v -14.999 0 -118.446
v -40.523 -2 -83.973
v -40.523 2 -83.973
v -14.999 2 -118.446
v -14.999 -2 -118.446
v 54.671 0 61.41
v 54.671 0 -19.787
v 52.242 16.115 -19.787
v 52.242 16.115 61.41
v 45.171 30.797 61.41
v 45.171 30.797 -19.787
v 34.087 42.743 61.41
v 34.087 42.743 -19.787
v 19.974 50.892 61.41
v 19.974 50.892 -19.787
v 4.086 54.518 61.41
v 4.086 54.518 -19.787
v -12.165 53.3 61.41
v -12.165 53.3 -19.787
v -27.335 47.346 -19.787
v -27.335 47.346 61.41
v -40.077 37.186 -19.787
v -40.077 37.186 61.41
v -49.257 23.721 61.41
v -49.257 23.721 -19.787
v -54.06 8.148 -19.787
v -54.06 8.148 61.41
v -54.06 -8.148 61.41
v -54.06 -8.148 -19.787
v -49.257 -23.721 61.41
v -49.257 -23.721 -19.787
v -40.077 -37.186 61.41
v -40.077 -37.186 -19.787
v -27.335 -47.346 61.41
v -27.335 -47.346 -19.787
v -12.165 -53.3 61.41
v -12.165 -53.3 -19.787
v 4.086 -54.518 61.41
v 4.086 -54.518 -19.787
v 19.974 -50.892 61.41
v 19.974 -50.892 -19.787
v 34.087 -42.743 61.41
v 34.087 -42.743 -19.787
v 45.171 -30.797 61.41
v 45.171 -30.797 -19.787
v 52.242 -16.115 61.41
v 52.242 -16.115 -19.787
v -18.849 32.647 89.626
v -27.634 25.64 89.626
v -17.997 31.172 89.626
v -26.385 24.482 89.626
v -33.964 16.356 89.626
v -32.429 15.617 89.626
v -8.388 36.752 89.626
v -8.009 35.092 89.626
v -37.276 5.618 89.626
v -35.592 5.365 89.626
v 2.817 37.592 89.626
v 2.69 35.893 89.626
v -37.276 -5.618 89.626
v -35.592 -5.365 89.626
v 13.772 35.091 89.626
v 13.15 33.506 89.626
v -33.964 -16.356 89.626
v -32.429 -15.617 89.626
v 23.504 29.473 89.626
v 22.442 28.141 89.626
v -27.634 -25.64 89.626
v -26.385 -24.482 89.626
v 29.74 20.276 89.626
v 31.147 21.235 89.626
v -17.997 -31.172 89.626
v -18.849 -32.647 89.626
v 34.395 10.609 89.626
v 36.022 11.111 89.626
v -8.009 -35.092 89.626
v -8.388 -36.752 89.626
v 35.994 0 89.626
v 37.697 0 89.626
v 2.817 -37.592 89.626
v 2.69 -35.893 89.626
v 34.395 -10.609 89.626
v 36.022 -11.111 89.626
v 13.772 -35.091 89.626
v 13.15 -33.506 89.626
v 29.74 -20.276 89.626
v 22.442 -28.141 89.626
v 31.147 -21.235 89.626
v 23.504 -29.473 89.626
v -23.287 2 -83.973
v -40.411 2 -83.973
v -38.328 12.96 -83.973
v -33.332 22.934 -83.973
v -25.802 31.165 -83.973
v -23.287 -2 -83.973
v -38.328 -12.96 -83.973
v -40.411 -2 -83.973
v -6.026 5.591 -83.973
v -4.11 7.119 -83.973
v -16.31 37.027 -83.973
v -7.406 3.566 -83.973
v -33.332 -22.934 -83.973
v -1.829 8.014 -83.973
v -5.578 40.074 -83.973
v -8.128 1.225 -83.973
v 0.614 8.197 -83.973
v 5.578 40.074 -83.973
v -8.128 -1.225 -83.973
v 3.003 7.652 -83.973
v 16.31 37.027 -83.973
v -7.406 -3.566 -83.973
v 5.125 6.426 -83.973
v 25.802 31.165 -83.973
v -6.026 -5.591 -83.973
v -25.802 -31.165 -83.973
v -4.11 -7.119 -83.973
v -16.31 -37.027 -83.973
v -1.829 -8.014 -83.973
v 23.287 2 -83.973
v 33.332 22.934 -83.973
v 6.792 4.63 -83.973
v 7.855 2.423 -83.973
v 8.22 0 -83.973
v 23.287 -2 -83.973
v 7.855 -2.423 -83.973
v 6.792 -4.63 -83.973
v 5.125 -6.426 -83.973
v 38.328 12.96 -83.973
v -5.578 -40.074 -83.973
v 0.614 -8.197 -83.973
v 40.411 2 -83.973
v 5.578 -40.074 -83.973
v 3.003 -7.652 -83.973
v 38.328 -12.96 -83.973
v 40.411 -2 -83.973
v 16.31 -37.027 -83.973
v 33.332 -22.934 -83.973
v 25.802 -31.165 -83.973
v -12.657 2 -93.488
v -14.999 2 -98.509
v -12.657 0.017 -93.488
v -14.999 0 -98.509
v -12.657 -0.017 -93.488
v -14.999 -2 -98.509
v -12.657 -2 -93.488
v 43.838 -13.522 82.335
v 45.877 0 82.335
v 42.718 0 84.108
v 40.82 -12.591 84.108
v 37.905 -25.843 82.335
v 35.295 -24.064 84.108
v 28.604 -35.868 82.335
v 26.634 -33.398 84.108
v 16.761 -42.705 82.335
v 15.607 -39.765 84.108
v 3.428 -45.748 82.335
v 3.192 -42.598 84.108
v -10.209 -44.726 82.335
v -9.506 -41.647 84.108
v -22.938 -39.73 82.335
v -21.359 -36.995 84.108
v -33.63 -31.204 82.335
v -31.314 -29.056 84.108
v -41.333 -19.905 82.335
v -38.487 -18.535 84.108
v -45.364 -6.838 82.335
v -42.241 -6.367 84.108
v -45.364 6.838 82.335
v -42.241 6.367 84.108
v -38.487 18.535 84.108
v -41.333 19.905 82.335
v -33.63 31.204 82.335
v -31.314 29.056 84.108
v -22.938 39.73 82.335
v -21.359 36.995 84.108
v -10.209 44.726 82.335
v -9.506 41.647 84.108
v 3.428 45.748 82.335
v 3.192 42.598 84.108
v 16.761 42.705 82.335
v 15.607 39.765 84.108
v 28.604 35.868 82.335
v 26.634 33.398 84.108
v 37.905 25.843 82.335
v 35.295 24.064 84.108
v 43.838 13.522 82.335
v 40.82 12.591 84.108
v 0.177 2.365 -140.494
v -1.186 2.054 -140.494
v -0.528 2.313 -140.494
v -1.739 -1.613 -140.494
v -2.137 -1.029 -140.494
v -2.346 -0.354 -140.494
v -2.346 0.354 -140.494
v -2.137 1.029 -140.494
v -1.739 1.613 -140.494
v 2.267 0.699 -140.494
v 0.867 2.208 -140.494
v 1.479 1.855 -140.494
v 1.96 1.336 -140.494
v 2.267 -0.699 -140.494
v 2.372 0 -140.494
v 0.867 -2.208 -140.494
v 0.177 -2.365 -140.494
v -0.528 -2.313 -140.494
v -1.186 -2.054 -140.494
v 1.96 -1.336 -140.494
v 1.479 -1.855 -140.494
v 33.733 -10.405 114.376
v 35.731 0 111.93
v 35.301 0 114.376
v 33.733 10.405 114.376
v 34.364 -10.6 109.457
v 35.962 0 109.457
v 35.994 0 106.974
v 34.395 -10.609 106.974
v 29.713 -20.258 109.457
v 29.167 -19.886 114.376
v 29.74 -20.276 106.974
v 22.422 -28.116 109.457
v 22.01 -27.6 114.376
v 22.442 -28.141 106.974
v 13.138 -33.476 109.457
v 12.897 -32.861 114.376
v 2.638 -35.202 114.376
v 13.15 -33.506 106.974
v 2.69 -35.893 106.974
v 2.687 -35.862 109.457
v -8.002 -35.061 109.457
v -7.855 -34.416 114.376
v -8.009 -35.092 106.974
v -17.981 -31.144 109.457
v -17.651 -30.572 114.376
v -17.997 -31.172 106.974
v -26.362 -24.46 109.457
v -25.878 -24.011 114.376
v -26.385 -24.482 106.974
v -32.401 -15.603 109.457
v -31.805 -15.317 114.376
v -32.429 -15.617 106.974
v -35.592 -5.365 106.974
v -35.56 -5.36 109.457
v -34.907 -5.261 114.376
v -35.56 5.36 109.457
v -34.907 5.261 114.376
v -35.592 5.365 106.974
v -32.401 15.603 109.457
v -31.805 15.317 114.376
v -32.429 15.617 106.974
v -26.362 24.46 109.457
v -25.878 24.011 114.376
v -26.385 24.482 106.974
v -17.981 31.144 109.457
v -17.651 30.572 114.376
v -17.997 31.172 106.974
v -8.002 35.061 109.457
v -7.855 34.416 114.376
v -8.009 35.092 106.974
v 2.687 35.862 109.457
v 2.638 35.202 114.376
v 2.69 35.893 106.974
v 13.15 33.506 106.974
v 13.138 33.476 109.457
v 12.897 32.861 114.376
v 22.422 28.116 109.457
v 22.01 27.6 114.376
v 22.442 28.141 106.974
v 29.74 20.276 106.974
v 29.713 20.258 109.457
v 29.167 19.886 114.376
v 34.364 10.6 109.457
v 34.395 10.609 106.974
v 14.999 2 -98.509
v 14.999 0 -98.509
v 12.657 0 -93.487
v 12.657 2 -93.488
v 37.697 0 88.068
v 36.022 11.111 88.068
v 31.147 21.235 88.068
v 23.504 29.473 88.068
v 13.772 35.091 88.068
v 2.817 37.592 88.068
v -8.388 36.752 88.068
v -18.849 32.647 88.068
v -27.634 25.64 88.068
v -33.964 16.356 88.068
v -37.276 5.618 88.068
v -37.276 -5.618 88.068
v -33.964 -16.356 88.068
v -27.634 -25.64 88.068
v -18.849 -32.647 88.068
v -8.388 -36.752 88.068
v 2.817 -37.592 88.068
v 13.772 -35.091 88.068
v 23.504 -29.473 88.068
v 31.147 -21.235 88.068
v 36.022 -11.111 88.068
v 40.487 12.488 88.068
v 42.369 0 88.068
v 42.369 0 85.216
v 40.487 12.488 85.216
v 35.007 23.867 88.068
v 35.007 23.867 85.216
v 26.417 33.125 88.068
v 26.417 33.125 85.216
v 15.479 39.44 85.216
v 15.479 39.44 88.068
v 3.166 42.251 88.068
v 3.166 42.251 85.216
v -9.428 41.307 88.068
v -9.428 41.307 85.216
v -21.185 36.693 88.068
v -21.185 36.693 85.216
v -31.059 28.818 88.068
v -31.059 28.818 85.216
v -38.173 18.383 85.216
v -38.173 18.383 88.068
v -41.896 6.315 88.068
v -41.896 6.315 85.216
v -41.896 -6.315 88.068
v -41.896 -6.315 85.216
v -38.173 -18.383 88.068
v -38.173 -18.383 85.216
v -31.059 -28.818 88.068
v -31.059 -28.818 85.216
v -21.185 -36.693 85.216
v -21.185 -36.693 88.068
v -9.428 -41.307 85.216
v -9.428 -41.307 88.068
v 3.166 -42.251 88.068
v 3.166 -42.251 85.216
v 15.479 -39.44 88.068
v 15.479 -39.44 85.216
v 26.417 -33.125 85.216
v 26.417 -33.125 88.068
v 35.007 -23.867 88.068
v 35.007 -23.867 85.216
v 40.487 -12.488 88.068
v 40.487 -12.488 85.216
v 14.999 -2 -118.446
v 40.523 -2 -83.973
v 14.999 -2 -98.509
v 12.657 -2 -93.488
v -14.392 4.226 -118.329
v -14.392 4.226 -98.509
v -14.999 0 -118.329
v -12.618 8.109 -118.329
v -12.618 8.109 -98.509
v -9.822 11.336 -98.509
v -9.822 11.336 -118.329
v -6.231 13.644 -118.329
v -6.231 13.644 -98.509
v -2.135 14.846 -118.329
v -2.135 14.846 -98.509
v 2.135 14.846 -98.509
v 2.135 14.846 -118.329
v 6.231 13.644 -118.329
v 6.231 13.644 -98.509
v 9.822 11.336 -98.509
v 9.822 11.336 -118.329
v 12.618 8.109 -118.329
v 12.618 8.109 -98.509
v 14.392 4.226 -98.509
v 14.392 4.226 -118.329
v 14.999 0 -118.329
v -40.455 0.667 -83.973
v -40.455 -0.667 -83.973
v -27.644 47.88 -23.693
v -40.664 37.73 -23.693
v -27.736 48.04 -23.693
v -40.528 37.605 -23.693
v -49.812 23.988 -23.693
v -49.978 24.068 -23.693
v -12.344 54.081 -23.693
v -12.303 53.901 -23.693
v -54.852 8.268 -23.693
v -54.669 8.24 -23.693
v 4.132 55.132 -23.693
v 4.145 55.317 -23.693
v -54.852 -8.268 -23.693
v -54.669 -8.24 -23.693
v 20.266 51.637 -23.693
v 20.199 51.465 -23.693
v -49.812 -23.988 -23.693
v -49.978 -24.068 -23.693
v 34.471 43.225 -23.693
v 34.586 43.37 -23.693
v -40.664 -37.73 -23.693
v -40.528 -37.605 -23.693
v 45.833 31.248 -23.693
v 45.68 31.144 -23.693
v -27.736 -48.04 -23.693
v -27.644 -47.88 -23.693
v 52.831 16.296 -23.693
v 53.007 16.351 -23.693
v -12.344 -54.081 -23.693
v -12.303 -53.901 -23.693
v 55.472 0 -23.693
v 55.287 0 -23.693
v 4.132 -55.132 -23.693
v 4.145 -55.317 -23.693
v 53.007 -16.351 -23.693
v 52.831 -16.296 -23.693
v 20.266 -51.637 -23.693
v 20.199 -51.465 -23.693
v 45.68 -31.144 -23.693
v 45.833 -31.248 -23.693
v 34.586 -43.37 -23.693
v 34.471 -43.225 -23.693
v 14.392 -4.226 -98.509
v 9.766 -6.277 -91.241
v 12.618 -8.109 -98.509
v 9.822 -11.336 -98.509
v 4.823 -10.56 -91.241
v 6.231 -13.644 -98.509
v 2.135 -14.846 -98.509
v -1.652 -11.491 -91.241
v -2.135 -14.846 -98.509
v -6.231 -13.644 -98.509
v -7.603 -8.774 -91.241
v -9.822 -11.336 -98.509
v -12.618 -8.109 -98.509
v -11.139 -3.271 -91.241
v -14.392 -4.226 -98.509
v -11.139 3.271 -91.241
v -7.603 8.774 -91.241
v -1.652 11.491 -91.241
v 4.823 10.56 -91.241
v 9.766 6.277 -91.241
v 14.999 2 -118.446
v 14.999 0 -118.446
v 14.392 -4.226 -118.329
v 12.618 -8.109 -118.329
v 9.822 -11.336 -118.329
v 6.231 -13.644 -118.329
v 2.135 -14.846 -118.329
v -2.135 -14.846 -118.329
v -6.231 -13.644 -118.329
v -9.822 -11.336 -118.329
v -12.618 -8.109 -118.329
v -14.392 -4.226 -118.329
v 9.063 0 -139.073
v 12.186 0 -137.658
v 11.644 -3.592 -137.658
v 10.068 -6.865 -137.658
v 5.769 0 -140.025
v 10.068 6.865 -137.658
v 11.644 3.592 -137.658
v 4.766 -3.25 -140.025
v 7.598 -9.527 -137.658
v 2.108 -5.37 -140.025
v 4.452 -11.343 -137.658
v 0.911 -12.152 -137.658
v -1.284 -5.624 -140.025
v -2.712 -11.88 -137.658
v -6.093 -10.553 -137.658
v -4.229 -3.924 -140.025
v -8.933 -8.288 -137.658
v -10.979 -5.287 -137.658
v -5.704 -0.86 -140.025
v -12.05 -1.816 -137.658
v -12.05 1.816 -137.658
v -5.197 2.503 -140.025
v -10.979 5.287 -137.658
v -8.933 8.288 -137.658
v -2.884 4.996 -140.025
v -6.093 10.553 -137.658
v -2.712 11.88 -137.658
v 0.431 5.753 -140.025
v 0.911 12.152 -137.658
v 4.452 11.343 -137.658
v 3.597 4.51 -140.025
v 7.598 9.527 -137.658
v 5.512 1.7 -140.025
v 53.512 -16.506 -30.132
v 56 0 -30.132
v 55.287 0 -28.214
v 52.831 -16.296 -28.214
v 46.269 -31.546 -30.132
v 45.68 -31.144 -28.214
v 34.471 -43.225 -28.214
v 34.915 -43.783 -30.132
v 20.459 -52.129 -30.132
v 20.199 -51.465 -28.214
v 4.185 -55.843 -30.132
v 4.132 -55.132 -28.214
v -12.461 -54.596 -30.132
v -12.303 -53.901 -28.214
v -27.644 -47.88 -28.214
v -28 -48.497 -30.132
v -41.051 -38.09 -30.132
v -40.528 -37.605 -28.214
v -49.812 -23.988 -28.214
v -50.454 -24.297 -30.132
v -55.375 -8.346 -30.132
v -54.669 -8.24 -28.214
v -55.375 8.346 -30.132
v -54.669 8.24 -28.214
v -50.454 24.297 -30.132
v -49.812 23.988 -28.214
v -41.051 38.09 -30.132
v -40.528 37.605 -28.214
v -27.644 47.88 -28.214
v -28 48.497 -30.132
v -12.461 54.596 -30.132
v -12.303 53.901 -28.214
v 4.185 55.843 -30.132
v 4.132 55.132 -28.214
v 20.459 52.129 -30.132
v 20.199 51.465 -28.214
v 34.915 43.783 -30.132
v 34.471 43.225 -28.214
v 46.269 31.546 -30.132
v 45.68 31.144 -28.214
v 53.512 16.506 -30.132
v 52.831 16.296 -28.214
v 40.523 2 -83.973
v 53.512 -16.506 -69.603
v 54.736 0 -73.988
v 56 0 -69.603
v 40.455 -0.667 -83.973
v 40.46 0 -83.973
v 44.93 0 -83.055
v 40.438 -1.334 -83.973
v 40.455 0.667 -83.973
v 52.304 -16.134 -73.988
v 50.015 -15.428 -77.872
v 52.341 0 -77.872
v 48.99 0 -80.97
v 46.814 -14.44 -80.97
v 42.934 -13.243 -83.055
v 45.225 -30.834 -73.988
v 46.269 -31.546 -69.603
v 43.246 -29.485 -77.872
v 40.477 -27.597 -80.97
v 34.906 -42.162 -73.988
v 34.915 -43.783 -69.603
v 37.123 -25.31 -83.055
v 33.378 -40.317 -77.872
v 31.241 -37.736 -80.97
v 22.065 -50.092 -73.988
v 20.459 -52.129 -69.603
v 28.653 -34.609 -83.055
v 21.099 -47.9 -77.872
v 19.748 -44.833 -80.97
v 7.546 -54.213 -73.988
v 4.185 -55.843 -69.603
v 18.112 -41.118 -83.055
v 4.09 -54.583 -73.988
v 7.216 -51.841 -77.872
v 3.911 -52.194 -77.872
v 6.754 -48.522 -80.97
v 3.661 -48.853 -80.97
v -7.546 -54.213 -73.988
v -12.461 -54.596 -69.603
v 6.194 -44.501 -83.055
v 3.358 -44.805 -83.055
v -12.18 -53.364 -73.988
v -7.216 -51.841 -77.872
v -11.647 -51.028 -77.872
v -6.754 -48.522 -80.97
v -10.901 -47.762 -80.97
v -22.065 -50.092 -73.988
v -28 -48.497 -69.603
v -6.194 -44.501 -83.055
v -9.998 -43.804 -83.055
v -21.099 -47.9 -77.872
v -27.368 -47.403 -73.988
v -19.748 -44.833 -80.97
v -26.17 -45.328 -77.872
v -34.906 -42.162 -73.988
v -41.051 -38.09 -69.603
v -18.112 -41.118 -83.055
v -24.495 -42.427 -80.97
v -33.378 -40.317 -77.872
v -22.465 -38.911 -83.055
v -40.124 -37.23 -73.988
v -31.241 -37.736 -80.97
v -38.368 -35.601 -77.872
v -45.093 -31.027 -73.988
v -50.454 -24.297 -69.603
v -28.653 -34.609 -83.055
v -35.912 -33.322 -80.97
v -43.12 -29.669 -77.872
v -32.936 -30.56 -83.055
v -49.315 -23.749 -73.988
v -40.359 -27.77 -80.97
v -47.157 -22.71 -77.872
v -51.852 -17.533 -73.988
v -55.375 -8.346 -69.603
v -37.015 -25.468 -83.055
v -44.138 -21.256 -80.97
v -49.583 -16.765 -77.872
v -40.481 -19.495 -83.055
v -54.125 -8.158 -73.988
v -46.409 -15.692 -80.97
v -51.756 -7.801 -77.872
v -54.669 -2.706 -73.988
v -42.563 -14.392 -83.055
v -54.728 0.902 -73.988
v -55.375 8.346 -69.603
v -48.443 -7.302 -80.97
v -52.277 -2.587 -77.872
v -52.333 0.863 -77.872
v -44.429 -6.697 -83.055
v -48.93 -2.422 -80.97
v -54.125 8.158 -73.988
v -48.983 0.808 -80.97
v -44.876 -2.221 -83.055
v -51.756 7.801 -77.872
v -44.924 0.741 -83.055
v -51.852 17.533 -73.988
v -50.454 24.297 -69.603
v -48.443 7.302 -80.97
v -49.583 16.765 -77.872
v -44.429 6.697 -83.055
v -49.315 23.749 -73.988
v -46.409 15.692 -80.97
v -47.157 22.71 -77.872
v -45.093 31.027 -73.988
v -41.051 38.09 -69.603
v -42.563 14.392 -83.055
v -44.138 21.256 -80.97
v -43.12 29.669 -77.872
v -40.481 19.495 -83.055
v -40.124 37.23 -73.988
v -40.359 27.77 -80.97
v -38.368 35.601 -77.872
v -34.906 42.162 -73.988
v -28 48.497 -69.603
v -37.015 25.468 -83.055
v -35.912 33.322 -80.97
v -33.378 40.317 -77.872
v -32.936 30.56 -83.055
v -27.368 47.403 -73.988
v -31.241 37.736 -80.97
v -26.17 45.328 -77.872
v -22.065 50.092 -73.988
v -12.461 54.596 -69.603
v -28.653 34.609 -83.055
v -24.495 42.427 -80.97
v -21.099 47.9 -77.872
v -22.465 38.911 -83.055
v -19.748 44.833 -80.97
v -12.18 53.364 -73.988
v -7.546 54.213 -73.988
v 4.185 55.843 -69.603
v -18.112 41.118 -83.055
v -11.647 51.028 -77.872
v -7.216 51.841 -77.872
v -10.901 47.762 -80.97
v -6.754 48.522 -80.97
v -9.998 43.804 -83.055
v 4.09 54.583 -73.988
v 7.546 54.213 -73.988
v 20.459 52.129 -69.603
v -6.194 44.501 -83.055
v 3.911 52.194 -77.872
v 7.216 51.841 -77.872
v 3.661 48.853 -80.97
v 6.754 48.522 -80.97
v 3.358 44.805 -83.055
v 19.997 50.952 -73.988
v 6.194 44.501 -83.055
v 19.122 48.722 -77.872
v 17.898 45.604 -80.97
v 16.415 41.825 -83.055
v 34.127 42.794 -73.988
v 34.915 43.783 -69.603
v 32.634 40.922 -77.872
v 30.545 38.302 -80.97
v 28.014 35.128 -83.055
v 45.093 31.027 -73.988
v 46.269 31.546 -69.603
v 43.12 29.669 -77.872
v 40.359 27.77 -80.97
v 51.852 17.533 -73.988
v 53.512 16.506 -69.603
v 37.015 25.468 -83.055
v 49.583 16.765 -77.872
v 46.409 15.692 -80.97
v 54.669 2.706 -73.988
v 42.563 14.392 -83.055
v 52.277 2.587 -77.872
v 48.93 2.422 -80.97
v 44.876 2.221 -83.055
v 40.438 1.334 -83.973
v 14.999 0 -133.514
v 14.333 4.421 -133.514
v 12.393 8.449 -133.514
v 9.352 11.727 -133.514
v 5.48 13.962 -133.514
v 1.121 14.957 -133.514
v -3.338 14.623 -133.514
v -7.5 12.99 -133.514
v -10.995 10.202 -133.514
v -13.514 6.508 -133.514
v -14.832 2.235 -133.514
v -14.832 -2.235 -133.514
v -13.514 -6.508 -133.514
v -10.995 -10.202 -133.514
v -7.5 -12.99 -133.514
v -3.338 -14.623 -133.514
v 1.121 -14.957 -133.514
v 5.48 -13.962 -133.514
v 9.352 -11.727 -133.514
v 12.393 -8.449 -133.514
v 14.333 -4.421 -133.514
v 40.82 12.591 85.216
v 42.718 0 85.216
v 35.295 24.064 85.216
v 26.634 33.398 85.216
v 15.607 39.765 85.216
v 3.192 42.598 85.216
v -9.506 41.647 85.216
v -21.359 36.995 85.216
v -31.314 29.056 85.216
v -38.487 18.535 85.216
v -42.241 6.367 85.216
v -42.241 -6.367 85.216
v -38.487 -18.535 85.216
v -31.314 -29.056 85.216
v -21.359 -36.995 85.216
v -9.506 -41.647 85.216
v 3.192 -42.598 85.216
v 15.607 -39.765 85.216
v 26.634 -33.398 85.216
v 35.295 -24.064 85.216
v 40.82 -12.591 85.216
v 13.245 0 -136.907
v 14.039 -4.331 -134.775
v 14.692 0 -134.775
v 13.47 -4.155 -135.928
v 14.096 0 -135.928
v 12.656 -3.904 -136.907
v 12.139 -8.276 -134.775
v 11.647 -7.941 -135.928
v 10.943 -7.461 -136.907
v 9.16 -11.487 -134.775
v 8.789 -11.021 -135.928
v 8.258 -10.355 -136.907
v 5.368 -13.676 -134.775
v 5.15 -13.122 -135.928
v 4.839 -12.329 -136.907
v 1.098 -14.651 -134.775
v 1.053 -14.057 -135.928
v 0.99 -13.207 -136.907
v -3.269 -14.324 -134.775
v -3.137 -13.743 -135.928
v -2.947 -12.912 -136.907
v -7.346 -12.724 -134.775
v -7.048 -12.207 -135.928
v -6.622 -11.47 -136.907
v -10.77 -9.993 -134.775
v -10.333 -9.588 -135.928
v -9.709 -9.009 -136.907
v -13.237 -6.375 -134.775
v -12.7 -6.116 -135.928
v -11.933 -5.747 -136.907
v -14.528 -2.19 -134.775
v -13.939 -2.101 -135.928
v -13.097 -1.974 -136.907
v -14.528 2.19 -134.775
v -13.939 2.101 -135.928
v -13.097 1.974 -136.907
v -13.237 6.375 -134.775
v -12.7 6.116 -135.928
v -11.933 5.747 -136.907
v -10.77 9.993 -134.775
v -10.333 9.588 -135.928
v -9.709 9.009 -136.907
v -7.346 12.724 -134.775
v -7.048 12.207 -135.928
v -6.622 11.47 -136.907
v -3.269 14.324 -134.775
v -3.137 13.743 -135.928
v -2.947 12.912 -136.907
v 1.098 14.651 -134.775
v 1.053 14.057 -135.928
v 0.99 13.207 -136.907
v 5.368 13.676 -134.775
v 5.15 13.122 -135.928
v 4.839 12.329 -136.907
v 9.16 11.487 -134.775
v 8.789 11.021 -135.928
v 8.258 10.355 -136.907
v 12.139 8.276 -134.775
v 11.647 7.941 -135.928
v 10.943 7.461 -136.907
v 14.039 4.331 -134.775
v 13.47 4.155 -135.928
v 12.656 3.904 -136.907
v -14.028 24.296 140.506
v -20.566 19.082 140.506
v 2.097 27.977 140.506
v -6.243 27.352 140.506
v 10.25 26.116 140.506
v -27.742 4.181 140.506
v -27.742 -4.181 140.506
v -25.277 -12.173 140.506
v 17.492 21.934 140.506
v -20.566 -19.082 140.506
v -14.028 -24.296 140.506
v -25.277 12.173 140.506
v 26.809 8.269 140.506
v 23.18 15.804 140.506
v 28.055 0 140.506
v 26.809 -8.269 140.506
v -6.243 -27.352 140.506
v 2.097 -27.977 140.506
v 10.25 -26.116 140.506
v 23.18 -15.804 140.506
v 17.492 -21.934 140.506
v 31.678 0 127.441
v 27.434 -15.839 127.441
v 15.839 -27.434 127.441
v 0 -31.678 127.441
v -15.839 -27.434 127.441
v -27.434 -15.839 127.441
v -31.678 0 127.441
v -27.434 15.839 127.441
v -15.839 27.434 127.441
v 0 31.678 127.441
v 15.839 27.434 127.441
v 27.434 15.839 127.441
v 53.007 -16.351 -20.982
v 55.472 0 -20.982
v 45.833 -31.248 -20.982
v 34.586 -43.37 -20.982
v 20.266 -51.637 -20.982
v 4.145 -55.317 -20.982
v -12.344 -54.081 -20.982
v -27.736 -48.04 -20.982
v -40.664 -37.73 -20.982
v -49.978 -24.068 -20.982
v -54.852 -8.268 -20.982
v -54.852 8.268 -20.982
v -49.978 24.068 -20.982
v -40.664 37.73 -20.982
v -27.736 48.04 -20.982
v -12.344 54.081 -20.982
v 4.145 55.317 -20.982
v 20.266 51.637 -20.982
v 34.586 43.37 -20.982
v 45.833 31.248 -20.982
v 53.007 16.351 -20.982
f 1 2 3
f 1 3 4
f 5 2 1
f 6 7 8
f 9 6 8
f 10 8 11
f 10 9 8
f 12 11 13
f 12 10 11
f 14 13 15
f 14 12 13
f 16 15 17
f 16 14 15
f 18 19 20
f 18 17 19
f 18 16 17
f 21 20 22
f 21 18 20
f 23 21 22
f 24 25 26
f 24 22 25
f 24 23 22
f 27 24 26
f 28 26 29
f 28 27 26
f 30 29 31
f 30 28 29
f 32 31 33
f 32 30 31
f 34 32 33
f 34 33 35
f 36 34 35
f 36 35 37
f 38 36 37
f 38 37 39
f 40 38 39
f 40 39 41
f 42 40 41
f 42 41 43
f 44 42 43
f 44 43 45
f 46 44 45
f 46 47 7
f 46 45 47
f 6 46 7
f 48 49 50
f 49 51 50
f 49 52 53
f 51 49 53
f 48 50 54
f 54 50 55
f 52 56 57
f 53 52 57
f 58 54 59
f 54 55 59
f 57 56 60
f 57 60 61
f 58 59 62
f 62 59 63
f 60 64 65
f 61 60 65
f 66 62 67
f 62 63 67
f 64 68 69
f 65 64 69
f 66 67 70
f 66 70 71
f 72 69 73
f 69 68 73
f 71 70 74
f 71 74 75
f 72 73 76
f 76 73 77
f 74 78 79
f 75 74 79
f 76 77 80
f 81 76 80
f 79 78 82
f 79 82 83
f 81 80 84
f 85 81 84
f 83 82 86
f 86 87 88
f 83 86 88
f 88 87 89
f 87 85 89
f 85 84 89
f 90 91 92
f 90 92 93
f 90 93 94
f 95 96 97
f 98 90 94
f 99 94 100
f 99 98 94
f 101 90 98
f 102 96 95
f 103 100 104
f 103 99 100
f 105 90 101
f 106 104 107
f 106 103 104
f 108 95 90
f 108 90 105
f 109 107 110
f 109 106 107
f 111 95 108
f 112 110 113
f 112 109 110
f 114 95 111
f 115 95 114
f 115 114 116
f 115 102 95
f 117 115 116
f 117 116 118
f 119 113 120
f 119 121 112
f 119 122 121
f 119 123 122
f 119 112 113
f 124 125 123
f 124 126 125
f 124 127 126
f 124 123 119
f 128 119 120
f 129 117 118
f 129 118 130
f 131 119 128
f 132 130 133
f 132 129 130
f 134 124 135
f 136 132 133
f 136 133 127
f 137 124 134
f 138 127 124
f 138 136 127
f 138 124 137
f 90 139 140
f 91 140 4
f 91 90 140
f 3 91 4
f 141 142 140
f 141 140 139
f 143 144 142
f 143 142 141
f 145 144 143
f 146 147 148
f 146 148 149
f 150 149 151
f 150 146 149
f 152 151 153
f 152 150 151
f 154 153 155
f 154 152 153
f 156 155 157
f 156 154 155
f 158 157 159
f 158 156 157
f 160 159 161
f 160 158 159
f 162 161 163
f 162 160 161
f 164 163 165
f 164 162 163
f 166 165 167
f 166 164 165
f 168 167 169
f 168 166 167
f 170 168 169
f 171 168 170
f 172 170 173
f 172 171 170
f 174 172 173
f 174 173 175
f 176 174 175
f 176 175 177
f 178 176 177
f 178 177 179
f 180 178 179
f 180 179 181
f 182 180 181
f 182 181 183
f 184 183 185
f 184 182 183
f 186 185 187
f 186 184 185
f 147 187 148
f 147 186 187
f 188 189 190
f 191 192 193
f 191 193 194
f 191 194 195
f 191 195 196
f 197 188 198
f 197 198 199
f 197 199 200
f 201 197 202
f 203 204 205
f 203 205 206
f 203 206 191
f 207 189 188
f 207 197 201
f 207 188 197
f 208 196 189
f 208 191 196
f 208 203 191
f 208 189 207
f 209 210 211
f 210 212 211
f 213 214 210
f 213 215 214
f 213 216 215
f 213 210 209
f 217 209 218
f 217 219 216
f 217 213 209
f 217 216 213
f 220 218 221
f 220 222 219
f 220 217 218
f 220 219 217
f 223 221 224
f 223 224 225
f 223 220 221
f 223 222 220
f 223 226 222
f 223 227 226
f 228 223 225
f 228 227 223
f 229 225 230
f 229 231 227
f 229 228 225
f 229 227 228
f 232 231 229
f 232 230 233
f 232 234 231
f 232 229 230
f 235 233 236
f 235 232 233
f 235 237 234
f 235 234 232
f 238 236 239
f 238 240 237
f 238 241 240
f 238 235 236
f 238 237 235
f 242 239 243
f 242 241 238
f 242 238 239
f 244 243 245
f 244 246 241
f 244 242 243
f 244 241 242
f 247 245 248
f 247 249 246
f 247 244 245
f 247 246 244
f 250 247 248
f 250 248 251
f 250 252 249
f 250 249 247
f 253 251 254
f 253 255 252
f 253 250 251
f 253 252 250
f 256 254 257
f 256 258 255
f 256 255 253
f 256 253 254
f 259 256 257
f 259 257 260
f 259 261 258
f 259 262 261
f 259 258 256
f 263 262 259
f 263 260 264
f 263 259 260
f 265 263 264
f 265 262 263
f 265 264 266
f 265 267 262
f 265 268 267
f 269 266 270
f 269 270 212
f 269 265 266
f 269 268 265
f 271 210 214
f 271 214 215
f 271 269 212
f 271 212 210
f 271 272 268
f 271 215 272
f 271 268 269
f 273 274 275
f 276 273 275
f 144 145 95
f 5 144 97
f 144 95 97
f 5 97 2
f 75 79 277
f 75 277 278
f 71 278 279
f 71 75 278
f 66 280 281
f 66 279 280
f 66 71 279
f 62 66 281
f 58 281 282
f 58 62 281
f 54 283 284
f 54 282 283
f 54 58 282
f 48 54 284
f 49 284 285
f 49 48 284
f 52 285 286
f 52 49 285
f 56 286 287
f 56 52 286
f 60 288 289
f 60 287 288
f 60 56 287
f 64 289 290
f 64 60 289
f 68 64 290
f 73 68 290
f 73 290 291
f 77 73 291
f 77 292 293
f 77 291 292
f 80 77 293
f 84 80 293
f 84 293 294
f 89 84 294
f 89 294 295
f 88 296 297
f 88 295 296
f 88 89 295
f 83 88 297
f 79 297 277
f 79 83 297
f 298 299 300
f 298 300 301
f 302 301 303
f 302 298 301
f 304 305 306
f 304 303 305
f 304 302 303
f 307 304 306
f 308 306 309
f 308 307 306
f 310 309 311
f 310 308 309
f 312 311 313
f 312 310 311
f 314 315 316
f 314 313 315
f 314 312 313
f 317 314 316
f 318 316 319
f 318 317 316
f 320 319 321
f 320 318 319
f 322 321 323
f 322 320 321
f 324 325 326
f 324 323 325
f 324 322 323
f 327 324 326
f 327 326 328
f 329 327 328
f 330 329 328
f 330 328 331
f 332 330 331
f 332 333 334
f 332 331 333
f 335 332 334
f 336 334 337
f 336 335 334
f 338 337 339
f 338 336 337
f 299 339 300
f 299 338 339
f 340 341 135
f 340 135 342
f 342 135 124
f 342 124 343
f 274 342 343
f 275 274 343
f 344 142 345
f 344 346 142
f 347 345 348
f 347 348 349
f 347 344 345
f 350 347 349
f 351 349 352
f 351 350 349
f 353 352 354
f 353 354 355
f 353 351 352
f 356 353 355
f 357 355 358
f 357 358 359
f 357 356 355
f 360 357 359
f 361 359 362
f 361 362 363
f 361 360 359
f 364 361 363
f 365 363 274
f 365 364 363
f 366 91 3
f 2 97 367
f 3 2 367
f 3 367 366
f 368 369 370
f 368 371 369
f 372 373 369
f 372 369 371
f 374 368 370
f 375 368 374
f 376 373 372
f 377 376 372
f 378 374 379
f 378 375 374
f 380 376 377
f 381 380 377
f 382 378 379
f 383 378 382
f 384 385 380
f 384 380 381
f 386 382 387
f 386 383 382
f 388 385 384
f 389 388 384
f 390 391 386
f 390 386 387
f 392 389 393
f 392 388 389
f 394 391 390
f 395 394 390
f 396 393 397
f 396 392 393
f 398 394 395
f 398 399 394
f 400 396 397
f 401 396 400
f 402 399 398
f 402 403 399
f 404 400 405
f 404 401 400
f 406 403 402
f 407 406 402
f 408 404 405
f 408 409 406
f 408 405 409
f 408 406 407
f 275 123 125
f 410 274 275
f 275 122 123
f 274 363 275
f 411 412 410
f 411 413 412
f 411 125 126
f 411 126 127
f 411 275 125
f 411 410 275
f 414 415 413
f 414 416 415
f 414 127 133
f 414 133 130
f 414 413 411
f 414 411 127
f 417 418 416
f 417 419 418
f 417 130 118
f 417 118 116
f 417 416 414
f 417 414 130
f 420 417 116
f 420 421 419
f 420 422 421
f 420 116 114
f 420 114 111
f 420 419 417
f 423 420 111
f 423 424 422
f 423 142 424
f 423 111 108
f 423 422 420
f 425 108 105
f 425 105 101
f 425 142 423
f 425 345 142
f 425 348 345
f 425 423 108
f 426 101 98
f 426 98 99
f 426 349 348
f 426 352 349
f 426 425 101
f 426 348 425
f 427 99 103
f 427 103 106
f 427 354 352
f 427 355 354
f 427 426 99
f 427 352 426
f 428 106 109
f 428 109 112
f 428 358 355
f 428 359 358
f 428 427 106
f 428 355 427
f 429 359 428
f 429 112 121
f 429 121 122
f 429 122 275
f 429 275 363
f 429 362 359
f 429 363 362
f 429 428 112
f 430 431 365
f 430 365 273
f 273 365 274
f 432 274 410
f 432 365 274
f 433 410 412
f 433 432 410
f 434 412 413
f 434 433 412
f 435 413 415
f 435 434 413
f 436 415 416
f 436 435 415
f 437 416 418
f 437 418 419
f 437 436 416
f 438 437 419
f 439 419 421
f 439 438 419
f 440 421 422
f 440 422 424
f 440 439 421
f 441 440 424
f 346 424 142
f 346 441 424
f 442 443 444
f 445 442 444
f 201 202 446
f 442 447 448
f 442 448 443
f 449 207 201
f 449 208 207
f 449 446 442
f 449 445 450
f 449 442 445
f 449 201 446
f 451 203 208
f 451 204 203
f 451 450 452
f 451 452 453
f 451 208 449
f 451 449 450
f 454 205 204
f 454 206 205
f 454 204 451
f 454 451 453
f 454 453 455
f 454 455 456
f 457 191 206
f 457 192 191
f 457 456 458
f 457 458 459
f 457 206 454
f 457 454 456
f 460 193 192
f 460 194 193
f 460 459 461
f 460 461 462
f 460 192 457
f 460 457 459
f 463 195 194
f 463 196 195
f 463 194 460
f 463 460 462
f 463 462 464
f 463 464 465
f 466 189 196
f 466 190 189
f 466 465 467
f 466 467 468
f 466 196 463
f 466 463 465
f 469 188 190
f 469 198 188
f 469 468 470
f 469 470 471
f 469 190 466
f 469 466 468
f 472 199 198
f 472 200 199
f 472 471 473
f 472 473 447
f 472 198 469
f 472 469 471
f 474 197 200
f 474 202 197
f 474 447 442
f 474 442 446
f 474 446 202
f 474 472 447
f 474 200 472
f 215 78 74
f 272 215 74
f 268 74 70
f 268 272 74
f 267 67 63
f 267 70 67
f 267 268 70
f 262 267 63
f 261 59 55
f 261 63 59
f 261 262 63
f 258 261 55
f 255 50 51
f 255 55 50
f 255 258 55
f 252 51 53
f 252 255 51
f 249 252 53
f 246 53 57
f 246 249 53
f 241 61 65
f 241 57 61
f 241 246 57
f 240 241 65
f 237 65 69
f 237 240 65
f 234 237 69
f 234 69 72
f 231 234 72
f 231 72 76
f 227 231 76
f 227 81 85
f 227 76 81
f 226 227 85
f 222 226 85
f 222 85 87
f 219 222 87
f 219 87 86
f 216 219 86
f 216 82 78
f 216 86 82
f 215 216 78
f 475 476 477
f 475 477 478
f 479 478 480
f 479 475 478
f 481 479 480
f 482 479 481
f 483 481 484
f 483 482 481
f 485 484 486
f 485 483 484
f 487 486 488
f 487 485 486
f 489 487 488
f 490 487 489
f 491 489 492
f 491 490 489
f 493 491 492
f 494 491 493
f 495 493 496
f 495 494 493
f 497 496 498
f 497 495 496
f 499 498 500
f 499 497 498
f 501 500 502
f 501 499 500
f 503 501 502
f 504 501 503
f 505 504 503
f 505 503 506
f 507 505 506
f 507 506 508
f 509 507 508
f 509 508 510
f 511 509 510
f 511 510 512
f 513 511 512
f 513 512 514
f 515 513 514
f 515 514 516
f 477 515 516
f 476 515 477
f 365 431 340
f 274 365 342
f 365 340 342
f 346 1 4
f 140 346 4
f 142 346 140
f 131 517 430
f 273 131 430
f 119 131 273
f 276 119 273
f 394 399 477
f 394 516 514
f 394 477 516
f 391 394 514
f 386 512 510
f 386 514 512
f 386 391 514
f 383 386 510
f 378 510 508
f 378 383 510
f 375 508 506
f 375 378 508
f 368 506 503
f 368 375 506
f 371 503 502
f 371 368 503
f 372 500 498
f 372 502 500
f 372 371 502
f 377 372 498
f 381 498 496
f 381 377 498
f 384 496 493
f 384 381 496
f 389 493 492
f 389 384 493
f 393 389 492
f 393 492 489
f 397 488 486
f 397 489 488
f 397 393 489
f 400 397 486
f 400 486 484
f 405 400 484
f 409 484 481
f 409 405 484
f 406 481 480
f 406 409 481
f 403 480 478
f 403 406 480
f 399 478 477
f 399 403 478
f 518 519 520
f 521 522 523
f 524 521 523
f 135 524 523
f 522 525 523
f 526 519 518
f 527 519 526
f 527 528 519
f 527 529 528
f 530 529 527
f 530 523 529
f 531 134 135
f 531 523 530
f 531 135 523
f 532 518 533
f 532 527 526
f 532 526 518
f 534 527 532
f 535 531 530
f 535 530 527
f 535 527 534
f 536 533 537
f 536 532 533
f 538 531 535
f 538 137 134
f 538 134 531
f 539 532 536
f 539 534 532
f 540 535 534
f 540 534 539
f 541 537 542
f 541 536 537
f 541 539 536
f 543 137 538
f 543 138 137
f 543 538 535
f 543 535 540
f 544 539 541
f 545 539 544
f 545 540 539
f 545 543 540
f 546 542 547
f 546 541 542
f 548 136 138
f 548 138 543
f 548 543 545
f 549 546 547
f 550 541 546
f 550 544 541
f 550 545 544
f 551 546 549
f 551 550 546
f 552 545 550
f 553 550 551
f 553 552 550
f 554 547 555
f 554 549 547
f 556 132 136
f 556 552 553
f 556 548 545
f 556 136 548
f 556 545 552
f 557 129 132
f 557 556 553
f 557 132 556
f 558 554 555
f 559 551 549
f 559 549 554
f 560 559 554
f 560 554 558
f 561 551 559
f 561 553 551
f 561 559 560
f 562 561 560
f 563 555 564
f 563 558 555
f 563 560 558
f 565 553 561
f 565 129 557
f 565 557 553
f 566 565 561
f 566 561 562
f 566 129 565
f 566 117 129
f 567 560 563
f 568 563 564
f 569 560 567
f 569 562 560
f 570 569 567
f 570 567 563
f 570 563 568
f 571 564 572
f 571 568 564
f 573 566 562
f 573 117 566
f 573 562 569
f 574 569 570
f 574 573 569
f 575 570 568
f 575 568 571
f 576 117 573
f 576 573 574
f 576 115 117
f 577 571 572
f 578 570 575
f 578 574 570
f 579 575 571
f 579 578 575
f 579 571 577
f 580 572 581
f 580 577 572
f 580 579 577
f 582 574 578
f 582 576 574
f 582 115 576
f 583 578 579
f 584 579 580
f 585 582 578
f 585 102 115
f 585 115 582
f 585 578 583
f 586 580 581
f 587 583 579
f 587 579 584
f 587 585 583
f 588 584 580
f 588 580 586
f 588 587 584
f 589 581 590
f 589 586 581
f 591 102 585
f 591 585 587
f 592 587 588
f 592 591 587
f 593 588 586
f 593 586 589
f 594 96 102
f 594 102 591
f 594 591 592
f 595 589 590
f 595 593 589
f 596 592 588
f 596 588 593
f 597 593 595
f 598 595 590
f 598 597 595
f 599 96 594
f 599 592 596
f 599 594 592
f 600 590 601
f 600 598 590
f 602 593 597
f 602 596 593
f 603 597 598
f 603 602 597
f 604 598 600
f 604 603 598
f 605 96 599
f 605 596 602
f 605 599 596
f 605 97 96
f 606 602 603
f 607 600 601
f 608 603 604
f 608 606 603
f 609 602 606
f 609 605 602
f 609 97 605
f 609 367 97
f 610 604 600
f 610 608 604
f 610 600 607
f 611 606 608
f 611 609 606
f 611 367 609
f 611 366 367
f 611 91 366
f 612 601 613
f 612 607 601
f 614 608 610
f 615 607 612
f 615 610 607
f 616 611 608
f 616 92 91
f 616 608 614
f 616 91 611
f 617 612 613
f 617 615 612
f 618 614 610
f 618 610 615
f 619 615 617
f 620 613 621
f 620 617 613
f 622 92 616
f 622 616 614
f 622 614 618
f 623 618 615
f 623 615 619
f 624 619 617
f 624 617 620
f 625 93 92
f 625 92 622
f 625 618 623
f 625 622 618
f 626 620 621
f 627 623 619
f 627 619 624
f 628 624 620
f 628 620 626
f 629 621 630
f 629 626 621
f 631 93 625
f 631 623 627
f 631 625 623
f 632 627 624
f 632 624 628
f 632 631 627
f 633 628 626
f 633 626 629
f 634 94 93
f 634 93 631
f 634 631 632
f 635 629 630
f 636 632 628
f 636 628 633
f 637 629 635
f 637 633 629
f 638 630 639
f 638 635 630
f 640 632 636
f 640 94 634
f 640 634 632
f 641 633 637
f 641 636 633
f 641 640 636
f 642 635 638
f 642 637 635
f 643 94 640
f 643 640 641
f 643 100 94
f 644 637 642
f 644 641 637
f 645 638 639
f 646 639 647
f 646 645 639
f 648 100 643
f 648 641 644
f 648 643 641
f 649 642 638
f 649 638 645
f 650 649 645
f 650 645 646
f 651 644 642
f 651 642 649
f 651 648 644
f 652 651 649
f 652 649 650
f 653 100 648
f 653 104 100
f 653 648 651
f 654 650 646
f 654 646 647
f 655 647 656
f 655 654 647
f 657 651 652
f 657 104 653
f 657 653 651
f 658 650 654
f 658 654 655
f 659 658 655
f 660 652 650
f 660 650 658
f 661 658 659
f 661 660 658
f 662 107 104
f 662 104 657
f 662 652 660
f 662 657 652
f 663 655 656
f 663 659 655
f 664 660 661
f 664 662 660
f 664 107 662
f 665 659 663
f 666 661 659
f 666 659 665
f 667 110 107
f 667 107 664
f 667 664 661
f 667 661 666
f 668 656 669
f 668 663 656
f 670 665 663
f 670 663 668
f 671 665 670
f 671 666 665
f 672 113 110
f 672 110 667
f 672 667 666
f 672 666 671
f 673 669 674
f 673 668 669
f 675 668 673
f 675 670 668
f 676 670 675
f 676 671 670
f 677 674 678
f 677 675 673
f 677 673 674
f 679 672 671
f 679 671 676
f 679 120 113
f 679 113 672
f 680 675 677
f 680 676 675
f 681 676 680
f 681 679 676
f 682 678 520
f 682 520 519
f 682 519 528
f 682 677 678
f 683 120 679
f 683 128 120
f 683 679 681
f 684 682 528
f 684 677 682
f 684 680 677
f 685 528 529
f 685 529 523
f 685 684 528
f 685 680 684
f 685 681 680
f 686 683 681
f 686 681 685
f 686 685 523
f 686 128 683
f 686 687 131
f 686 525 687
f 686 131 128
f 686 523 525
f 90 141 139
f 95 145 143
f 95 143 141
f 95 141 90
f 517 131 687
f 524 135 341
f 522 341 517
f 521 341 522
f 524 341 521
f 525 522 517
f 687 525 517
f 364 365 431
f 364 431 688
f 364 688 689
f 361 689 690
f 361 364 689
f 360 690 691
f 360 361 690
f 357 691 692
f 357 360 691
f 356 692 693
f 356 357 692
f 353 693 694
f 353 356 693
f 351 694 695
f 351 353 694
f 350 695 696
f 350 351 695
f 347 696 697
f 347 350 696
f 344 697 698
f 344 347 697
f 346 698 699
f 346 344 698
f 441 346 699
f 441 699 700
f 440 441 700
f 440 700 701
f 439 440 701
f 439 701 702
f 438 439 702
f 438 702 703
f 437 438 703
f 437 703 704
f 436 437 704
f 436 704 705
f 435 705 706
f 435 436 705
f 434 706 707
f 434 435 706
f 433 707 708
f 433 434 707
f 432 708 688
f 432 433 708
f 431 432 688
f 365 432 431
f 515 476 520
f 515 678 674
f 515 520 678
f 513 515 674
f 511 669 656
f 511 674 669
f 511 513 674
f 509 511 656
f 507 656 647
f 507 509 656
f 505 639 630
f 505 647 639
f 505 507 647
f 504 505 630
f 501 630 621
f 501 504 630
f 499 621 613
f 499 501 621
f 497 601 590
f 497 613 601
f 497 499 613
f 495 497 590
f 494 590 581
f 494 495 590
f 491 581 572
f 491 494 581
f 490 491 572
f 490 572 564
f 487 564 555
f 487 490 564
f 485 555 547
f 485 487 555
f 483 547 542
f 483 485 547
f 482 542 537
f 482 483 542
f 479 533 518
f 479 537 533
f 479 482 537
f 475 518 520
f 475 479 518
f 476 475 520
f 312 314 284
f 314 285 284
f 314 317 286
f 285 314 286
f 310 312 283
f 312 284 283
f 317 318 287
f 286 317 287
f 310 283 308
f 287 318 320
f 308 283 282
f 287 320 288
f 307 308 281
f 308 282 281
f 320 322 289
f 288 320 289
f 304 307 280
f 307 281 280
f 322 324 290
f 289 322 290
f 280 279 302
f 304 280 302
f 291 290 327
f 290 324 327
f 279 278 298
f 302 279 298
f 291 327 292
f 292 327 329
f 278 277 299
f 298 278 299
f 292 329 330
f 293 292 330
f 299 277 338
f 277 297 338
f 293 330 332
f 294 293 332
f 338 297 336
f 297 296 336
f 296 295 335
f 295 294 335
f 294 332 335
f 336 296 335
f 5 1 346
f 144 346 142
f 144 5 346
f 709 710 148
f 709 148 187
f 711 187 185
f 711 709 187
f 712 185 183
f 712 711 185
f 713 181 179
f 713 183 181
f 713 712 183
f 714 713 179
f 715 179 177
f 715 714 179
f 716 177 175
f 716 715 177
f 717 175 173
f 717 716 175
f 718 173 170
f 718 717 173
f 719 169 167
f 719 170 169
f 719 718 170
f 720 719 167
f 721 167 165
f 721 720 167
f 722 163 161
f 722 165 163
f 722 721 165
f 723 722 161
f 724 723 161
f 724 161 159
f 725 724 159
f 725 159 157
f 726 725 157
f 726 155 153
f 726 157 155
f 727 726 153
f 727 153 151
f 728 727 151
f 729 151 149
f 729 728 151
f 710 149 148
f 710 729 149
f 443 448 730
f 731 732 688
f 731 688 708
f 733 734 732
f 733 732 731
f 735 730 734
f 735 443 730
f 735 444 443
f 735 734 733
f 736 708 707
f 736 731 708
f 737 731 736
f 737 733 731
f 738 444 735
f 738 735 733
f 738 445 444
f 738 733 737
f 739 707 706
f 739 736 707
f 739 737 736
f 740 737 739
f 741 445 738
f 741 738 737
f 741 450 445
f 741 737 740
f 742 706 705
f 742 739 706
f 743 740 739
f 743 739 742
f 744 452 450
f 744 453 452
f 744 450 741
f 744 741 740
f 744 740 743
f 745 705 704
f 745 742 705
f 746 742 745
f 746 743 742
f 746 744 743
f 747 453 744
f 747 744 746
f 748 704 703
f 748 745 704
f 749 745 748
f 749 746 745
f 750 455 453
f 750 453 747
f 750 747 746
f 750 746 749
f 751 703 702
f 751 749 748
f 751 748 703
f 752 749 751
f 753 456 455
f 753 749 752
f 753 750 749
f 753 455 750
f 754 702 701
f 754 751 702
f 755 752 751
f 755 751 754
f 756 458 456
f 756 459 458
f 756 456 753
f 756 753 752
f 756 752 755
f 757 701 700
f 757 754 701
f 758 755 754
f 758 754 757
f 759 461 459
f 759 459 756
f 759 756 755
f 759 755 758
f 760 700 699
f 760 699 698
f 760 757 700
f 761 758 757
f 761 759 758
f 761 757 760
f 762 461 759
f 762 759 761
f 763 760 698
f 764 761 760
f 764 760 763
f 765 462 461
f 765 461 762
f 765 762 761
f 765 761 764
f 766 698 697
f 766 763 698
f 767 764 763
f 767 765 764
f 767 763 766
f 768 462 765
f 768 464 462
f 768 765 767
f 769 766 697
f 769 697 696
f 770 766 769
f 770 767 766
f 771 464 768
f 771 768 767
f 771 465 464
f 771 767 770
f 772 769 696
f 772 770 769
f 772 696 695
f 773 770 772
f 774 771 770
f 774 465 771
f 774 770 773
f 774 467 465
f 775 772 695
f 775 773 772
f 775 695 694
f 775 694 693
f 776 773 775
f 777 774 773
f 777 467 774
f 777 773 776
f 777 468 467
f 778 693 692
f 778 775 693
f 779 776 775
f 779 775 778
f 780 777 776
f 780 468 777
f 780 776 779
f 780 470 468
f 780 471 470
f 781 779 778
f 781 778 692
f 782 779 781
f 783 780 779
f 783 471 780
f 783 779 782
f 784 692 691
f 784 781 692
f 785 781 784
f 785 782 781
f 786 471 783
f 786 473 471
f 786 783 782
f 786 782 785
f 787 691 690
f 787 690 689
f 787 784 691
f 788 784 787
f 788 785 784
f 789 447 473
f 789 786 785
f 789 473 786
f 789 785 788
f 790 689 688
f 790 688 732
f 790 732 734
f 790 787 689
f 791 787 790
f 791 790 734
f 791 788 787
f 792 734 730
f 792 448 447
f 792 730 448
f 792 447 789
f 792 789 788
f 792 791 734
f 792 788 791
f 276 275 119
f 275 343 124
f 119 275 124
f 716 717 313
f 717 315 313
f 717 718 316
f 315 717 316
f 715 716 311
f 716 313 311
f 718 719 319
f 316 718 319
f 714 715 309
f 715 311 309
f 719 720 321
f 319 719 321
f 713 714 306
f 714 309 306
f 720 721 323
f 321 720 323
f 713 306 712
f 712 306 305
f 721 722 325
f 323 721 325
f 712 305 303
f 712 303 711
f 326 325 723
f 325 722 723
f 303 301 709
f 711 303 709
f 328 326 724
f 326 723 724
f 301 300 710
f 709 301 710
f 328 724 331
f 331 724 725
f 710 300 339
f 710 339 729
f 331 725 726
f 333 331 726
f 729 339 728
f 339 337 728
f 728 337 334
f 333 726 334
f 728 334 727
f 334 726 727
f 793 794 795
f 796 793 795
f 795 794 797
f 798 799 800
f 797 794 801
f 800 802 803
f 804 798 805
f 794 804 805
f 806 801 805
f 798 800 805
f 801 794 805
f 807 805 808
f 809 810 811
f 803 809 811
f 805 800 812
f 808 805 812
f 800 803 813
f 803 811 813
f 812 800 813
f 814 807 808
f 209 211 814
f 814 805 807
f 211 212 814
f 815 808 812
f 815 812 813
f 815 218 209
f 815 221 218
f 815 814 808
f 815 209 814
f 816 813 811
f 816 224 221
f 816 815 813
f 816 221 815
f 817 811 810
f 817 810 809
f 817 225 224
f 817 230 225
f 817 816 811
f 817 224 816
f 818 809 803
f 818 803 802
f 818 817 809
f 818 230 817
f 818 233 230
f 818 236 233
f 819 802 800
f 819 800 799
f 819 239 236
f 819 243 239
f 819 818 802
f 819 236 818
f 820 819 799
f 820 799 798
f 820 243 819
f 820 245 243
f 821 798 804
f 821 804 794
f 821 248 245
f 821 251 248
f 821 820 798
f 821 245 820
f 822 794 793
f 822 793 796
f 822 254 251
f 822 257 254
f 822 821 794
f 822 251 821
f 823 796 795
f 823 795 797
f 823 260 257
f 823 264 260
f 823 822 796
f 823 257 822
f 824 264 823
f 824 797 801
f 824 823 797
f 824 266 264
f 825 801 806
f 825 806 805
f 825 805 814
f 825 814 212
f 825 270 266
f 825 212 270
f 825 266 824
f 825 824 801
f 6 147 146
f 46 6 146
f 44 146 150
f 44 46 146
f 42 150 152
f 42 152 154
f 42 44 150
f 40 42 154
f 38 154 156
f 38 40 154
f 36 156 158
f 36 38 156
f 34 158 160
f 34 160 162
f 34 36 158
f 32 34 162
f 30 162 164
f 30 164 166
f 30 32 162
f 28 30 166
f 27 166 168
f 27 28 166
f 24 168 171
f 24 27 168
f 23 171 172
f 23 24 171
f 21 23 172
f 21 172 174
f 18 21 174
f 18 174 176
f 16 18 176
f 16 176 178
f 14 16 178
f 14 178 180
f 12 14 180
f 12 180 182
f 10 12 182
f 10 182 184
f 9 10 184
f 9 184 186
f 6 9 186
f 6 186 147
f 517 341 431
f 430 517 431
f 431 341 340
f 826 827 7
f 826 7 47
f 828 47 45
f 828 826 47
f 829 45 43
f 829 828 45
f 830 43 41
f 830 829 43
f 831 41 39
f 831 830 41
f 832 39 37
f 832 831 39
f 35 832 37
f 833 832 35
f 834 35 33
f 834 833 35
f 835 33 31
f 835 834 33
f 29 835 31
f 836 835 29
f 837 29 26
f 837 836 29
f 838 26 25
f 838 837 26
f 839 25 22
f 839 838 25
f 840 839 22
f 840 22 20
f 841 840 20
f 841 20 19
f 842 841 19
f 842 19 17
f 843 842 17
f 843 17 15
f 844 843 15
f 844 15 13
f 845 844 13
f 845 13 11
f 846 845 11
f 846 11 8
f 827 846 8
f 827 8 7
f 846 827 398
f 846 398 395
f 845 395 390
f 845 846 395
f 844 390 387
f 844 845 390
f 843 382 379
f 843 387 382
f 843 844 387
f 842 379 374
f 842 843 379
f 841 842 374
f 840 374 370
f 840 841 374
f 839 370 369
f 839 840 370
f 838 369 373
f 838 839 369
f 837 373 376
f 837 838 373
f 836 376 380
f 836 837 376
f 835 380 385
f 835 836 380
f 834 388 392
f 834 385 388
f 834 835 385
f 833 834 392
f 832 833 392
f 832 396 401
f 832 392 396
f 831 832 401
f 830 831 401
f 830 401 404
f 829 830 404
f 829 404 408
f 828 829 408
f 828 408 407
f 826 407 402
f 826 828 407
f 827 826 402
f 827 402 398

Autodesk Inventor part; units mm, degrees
ref_plane "YZ Plane" through (0, 0, 0) normal (1, 0, 0) x (0, 1, 0)
ref_plane "XZ Plane" through (0, 0, 0) normal (0, 1, 0) x (-1, 0, 0)
ref_plane "XY Plane" through (0, 0, 0) normal (0, 0, 1) x (1, 0, 0)
sketch "Sketch3" plane through (0, 0, 0) normal (0, 1, 0) x (-1, 0, 0)
  line L0 (-148.4998, -210.0502) -> (-148.4998, 210.0502) construction
  line L1 (-148.4998, 210.0502) -> (148.4998, 210.0502) construction
  line L2 (148.4998, 210.0502) -> (148.4998, -210.0502) construction
  line L3 (148.4998, -210.0502) -> (-148.4998, -210.0502) construction
  line L4 (-278.8232, 0) -> (0, 0) construction
  line L5 (0, 0) -> (0, 323.3607) construction
  line L6 (-14.9991, -133.5139) -> (-14.9991, -118.3294)
  line L7 (-56, -69.6027) -> (-56, -30.1317)
  line L8 (-56, -30.1317) -> (-55.287, -28.2144)
  line L9 (-55.287, -28.2144) -> (-55.287, -23.6926)
  line L10 (-55.287, -23.6926) -> (-55.4718, -23.6926)
  line L11 (-55.4718, -23.6926) -> (-55.4718, -20.982)
  line L12 (-55.4718, -20.982) -> (-54.6709, -19.7868)
  line L13 (-54.6709, -19.7868) -> (-54.6709, 61.4098)
  line L14 (-54.6709, 61.4098) -> (-45.8766, 82.3346)
  line L15 (-45.8766, 82.3346) -> (-42.7179, 84.1079)
  line L16 (-42.7179, 84.1079) -> (-42.7179, 85.2162)
  line L17 (-42.7179, 85.2162) -> (-42.369, 85.2162)
  line L18 (-42.369, 85.2162) -> (-42.369, 88.0675)
  line L19 (-42.369, 88.0675) -> (-37.697, 88.0675)
  line L20 (-37.697, 88.0675) -> (-37.697, 89.6261)
  line L21 (-37.697, 89.6261) -> (-35.994, 89.6261)
  line L22 (-35.994, 89.6261) -> (-35.994, 106.9741)
  line L23 (-35.3011, 114.3761) -> (-28.055, 140.5061)
  line L24 (-28.055, 140.5061) -> (0, 140.5061)
  arc A0 (-12.1858, -137.6578) -> (-2.3721, -140.4939) centre (-0.8223, -116.7339) ccw
  arc A1 (-14.9991, -133.5139) -> (-12.1858, -137.6578) centre (-9.5817, -132.8629) ccw
  line L25 (0, -140.4939) -> (-2.3721, -140.4939)
  line L26 (0, 140.5061) -> (0, -140.4939)
  arc A2 (-35.3011, 114.3761) -> (-35.994, 106.9741) centre (-5.1555, 107.8209) ccw
  arc A3 (-56, -69.6027) -> (-40.4601, -83.9729) centre (-39.3408, -67.175) ccw
  line L27 (-40.4601, -83.9729) -> (-8.2198, -83.9729)
  line L28 (-8.2198, -83.9729) -> (-14.9991, -98.5086)
  line L29 (-14.9991, -98.5086) -> (-14.9991, -118.3294)
  dimension "d79" = 281
  dimension "d83" = 56
revolve "Motor" add sketch "Sketch3" angle 360 about axis through (0, 0, 140.5061) along (0, 0, -1)
sketch "Sketch6" plane through (0, 0, 0) normal (0, 1, 0) x (-1, 0, 0)
  line L0 (-14.9991, -118.4458) -> (-14.9991, -98.5086)
  line L1 (-12.6573, -93.4875) -> (-23.2868, -83.9729)
  line L2 (-23.2868, -83.9729) -> (-40.5228, -83.9729)
  line L3 (-40.5228, -83.9729) -> (-14.9991, -118.4458)
  line L4 (14.9991, -98.5086) -> (-14.9991, -98.5086) projected
  line L5 (-14.9991, -98.5086) -> (-12.6573, -93.4875)
  line L6 (0, -142.1349) -> (0, 23.6892) construction
  line L7 (14.9991, -118.4458) -> (14.9991, -98.5086)
  line L8 (12.6573, -93.4875) -> (23.2868, -83.9729)
  line L9 (23.2868, -83.9729) -> (40.5228, -83.9729)
  line L10 (40.5228, -83.9729) -> (14.9991, -118.4458)
  line L11 (14.9991, -98.5086) -> (12.6573, -93.4875)
  point P0 (0, 0)
extrude "Motor inlet" add sketch "Sketch6" along normal mid plane 4
properties part number "Engine"
